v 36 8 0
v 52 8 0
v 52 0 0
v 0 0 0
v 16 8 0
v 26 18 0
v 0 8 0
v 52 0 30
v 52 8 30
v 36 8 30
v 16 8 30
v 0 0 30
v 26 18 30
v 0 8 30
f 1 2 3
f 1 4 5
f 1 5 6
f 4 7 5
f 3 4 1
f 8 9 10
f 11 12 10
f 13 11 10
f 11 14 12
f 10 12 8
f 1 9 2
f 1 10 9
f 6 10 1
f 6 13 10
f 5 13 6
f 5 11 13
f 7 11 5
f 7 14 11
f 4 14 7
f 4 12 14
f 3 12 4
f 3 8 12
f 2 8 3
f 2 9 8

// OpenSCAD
$fn = 32;

// ----------------------------------------------------------------------
// V guide rail: vrib, 52 mm wide
// ----------------------------------------------------------------------

// --- parameters (mm) ---
rail_w = 52;              // rail width, X
base_t = 8;               // base plate thickness
v_depth = 10;             // V feature depth / height
v_half_w = 10;            // half width of the V at the base face
plate_t = 30;             // rail length, Z (the extrusion height)
fit_tol = 0.05;           // declared fit tolerance (prompt contract)
free_tol = 0.2;           // declared free tolerance (prompt contract)

profile = [[0, 0], [52, 0], [52, 8], [36, 8], [26, 18], [16, 8], [0, 8]];  // primary outline, 7 points, counter clockwise

// --- the one profile operation ---
linear_extrude(height = plate_t) polygon(points = profile);
